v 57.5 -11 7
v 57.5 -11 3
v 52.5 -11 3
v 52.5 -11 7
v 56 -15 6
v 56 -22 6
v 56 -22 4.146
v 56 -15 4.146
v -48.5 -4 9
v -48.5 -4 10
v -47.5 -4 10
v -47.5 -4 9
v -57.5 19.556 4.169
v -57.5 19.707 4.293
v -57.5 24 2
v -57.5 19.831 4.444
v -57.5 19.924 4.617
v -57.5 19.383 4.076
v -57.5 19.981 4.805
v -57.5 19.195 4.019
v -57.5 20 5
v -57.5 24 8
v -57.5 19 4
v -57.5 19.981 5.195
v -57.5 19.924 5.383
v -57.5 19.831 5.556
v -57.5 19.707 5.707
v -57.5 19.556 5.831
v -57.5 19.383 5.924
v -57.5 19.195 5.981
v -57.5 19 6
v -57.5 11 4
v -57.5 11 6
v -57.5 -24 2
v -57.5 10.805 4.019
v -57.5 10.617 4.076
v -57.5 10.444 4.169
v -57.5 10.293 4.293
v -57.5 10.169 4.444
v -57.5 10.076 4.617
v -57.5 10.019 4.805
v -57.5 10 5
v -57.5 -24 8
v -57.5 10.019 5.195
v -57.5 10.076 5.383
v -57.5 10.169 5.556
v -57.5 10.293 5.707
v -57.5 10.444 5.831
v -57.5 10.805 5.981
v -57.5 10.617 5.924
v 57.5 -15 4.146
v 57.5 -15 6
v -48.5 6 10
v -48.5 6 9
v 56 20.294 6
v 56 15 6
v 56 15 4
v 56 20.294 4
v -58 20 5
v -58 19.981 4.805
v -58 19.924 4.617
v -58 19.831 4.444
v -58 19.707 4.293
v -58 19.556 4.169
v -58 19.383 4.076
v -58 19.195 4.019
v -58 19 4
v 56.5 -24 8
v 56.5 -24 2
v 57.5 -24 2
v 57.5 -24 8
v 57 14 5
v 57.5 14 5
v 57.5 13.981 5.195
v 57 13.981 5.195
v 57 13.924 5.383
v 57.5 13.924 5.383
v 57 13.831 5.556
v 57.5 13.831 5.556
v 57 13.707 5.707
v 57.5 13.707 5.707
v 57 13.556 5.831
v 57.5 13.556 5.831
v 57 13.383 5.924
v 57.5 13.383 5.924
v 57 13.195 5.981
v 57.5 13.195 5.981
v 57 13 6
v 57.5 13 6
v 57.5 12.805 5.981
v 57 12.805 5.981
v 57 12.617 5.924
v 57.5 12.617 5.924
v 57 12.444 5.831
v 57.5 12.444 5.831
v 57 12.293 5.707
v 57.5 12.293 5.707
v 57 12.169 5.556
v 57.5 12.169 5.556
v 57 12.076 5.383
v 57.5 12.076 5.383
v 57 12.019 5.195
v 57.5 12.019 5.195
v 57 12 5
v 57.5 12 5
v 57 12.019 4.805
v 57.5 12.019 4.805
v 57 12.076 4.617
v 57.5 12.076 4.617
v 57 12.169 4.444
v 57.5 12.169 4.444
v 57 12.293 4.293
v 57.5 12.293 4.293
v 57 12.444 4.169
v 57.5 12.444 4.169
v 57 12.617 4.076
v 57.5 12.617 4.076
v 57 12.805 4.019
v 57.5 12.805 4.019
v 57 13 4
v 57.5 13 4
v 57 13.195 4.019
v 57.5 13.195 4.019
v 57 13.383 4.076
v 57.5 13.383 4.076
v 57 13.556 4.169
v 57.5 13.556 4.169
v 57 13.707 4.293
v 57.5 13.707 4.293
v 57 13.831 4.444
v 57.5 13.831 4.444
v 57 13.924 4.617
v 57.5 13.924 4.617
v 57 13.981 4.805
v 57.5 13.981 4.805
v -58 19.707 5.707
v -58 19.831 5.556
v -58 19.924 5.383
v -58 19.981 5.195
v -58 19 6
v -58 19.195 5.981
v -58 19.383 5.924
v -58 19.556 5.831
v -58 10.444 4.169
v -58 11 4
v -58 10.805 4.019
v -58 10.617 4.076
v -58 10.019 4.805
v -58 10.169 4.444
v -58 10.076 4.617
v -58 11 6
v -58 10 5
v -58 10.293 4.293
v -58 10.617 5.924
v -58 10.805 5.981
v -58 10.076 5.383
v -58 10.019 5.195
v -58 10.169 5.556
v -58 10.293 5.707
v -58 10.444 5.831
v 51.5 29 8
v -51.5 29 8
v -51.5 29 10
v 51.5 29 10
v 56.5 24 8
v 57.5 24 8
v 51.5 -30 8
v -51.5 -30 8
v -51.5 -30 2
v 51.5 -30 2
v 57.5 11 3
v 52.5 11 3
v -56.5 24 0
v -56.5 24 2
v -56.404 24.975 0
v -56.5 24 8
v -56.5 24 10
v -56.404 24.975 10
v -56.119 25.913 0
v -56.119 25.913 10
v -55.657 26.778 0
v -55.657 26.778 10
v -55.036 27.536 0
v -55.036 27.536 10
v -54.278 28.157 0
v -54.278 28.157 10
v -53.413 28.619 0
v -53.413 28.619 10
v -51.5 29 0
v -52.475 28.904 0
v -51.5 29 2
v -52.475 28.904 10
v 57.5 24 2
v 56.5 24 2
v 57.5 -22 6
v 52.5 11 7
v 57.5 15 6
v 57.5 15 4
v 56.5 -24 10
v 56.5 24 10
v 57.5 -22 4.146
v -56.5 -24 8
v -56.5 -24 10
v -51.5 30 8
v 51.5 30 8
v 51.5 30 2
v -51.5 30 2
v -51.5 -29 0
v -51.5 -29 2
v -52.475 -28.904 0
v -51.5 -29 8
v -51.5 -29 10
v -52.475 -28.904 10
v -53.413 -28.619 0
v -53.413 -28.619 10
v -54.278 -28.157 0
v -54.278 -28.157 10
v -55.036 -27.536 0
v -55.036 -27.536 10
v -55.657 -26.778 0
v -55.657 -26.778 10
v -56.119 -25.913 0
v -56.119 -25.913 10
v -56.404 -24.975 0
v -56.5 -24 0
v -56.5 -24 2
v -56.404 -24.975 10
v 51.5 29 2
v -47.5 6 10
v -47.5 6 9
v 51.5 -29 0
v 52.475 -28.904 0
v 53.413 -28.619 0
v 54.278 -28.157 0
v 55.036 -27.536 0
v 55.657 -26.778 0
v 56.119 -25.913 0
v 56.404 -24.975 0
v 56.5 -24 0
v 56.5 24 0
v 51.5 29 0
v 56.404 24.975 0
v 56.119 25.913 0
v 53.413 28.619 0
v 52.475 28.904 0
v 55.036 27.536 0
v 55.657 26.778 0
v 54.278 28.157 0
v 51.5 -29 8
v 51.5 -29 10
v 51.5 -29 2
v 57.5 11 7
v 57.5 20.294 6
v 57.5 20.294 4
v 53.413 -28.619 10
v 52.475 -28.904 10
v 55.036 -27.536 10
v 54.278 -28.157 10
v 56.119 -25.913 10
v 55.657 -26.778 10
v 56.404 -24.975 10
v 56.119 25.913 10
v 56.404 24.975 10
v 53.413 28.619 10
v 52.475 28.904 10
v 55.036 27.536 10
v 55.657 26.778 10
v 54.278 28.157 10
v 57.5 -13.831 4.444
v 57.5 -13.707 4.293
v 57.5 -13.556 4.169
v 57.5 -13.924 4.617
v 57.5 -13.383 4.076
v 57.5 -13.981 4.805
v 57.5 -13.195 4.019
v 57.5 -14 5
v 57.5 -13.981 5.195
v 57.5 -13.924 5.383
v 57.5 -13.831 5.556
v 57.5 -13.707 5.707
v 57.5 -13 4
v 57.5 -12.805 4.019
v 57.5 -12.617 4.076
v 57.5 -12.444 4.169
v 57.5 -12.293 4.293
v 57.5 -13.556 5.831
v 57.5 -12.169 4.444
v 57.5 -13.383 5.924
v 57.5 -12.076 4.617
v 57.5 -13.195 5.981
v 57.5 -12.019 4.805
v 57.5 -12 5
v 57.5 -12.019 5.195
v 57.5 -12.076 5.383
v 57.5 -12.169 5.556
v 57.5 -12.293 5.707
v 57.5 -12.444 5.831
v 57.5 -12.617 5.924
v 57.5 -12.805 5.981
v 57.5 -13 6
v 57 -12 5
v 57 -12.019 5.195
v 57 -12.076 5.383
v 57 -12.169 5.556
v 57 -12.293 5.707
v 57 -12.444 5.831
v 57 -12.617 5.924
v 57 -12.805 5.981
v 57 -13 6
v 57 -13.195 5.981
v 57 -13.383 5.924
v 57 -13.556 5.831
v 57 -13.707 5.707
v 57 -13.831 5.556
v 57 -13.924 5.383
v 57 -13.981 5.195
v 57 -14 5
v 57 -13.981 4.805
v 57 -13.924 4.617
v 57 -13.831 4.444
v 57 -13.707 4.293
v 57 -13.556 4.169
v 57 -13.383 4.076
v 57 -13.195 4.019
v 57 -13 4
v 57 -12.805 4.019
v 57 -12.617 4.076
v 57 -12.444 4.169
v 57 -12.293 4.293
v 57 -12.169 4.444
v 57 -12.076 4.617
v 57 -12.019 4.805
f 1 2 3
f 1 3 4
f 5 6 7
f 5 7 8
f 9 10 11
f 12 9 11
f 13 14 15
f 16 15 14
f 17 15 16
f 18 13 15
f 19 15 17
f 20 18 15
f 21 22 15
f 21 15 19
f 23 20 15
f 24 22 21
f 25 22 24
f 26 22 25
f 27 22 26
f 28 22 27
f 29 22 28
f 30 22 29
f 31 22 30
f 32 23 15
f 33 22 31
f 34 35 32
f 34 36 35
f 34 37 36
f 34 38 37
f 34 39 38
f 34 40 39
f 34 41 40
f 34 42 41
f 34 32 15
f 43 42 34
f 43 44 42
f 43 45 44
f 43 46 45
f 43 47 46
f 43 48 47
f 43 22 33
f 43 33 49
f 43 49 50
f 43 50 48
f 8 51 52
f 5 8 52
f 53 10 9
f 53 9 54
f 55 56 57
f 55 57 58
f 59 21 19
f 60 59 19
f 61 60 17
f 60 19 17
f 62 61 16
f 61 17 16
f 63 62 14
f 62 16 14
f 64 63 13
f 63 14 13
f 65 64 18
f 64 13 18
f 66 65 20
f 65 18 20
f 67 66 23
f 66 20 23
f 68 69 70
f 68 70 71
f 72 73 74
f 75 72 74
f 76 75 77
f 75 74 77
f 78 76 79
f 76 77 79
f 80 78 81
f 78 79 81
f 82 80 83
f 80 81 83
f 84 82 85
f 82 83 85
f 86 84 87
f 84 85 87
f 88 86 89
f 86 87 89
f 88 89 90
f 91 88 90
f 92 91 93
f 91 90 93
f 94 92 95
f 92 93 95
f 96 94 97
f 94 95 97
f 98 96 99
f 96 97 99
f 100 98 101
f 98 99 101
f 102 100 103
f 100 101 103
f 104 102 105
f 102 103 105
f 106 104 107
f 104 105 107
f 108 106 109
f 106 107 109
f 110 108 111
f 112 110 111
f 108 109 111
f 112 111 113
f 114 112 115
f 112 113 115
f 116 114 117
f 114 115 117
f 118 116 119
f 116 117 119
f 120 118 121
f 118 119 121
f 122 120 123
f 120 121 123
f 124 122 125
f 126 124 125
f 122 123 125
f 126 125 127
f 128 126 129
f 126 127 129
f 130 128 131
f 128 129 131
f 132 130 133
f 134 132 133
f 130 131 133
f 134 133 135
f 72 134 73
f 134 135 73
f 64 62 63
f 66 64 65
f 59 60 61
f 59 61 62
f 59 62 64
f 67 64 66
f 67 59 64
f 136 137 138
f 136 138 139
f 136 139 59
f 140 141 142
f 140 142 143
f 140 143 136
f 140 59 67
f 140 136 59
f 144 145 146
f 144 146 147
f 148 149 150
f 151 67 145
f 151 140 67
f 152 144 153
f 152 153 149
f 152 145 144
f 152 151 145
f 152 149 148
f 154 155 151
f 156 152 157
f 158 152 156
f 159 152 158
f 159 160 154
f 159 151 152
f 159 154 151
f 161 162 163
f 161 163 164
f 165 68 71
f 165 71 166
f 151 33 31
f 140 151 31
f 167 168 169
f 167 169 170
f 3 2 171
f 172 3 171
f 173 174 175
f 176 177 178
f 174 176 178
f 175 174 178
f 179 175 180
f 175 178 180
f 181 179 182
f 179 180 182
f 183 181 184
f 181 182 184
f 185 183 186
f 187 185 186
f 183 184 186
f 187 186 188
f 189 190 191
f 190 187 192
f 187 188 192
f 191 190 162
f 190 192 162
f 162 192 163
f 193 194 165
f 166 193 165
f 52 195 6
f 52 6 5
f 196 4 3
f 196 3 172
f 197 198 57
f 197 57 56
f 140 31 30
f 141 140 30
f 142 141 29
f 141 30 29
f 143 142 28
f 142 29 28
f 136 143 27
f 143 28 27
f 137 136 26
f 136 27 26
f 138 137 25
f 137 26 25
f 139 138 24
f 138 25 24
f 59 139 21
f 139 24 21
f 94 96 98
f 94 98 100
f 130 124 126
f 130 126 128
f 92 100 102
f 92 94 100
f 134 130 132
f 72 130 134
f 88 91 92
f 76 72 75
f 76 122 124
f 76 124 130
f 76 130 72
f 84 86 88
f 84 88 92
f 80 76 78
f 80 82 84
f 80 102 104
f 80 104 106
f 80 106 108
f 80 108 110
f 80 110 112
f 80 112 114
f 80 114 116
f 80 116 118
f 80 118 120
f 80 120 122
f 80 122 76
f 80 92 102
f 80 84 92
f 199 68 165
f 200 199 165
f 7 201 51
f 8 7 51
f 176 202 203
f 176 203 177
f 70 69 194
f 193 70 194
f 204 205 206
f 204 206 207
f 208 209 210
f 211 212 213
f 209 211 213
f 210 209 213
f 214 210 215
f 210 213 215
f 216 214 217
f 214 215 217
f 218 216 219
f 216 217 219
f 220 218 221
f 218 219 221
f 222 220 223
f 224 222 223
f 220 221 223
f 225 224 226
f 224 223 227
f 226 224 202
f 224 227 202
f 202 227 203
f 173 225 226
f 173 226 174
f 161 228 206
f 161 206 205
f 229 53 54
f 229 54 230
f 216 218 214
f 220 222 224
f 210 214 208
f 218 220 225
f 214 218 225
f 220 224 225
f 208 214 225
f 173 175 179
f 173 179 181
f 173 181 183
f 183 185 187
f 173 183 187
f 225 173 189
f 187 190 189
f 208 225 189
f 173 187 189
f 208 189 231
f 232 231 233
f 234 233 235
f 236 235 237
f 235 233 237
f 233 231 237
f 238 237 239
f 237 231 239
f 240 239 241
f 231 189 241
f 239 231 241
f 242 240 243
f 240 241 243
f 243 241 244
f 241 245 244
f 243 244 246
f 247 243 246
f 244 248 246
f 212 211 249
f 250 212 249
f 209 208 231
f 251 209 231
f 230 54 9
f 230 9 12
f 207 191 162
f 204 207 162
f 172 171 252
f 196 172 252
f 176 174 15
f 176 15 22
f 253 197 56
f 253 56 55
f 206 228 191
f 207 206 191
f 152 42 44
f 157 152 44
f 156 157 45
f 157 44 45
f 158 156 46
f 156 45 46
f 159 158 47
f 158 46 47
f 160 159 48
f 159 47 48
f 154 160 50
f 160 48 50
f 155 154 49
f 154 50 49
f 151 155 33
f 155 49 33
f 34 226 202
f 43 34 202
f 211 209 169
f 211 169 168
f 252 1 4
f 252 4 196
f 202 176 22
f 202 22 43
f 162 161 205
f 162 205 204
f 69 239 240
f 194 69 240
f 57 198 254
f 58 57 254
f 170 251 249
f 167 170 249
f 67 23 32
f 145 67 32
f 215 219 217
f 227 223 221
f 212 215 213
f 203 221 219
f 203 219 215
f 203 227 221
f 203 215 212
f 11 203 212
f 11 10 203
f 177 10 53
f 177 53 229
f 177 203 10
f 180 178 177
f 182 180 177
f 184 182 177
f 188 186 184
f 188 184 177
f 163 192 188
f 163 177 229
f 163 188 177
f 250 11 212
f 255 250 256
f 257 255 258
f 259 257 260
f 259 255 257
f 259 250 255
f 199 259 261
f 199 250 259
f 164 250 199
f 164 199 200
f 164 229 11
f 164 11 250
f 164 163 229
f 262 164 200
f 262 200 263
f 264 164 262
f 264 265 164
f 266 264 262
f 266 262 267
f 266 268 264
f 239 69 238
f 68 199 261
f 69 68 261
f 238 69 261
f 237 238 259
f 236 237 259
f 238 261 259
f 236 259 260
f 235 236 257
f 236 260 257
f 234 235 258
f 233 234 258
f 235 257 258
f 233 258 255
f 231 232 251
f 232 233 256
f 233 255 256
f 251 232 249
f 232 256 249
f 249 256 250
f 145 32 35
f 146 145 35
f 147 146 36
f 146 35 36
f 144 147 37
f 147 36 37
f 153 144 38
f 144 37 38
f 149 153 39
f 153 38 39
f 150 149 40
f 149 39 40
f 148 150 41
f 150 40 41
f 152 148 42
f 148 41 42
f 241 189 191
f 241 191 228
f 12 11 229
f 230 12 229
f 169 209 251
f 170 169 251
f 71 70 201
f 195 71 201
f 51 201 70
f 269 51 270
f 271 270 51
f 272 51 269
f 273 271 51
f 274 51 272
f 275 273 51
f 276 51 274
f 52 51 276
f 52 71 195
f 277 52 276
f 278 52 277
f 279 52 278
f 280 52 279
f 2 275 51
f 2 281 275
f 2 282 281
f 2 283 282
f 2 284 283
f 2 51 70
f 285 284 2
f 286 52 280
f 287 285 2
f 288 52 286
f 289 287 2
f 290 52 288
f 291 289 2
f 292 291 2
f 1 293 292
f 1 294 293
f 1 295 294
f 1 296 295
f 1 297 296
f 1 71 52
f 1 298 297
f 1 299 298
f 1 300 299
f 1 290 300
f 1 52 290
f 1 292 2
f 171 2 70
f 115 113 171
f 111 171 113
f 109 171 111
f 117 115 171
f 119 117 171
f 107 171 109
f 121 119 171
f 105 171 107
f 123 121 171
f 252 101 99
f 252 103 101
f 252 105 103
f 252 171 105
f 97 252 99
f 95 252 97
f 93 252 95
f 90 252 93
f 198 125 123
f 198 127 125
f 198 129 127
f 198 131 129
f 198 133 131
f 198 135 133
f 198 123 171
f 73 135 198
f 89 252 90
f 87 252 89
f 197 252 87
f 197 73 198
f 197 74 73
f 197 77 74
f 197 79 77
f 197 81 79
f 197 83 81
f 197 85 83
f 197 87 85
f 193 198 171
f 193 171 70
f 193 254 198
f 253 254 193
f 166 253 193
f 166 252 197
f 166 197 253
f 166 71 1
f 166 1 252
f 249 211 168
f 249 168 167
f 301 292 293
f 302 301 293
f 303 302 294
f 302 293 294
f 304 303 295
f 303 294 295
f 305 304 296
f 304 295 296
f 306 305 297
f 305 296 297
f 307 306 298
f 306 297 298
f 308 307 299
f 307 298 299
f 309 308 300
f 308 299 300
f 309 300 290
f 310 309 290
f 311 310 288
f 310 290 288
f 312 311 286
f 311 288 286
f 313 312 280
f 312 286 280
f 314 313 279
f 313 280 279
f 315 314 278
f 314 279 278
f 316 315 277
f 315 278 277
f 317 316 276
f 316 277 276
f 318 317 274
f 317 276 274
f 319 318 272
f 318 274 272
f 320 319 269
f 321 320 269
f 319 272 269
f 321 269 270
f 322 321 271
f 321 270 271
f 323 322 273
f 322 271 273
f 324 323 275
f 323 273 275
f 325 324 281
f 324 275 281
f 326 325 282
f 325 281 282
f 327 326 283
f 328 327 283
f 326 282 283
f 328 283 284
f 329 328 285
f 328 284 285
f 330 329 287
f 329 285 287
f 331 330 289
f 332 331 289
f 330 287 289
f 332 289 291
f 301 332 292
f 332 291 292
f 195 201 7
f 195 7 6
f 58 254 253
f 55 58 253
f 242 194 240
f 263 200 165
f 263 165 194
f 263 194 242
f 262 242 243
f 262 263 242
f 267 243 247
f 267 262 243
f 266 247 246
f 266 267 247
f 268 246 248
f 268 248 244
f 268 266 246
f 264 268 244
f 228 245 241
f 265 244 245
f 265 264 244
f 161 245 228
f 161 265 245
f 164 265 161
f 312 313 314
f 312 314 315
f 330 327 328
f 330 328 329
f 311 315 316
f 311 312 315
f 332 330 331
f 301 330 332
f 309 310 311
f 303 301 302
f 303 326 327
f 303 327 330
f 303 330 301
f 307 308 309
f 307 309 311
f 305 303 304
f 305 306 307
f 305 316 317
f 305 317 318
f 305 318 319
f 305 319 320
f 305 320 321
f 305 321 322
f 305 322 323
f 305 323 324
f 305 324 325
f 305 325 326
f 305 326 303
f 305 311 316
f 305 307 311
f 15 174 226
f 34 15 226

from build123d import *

# Parameters (mm, degrees)
F0_W       = 113
F0_H       = 58
F1_DEPTH   = 10
F2_R       = 5
F3_R       = 5
F4_R       = 5
F5_R       = 5
F6_W       = 1
F6_H       = 10
F11_DEPTH  = 1
F10_W      = 48
F10_H      = 6
F12_DEPTH  = 1
F7_W       = 103
F7_H       = 6
F13_DEPTH  = 1
F8_W       = 48
F8_H       = 6
F14_DEPTH  = 1
F9_W       = 103
F9_H       = 6
F15_DEPTH  = 1
F16_W      = 22
F16_H      = 4
F17_DEPTH  = 5
F18_R      = 1
F19_DEPTH  = 0.5
F19_FACE_R = 1
F20_DEPTH  = 0.5
F21_DEPTH  = 0.5
F22_R      = 1
F23_DEPTH  = 0.5
F24_W      = 5.293664
F24_H      = 2
F25_DEPTH  = 1.5
F26_W      = 7
F26_H      = 1.853713
F28_DEPTH  = 1.5
F31_DEPTH  = 0.5
F32_R      = 2.5
F33_DEPTH  = 5
F33_FACE_R = 2.5
F34_DEPTH  = 5


with BuildPart() as f1:
    # F0 (on Top) → F1 (new body)
    with BuildSketch(Plane.XY):
        Rectangle(F0_W, F0_H)
    extrude(amount=F1_DEPTH)

    # F2
    f2_edges = [f1.edges().sort_by_distance(p)[0] for p in [
        (56.5, 29, 5),
    ]]
    fillet(f2_edges, radius=F2_R)

    # F3
    f3_edges = [f1.edges().sort_by_distance(p)[0] for p in [
        (56.5, -29, 5),
    ]]
    fillet(f3_edges, radius=F3_R)

    # F4
    f4_edges = [f1.edges().sort_by_distance(p)[0] for p in [
        (-56.5, -29, 5),
    ]]
    fillet(f4_edges, radius=F4_R)

    # F5
    f5_edges = [f1.edges().sort_by_distance(p)[0] for p in [
        (-56.5, 29, 5),
    ]]
    fillet(f5_edges, radius=F5_R)

    # F6 (on face) → F11 (cut)
    with BuildSketch(Plane.XY.offset(10)):
        with Locations((-48, 1)):
            Rectangle(F6_W, F6_H)
    extrude(amount=-F11_DEPTH, mode=Mode.SUBTRACT)

    # F10 (on face) → F12 (join)
    with BuildSketch(Plane(origin=(-56.5, 0, 0), x_dir=(0, -1, 0), z_dir=(-1, 0, 0))):
        with Locations((0, 5)):
            Rectangle(F10_W, F10_H)
    extrude(amount=F12_DEPTH)

    # F7 (on face) → F13 (join)
    with BuildSketch(Plane(origin=(0, 29, 0), x_dir=(-1, 0, 0), z_dir=(0, 1, 0))):
        with Locations((0, 5)):
            Rectangle(F7_W, F7_H)
    extrude(amount=F13_DEPTH)

    # F8 (on face) → F14 (join)
    with BuildSketch(Plane.YZ.offset(56.5)):
        with Locations((0, 5)):
            Rectangle(F8_W, F8_H)
    extrude(amount=F14_DEPTH)

    # F9 (on face) → F15 (join)
    with BuildSketch(Plane.XZ.offset(29)):
        with Locations((0, 5)):
            Rectangle(F9_W, F9_H)
    extrude(amount=F15_DEPTH)

    # F16 (on face) → F17 (cut)
    with BuildSketch(Plane.YZ.offset(57.5)):
        with Locations((0, 5)):
            Rectangle(F16_W, F16_H)
    extrude(amount=-F17_DEPTH, mode=Mode.SUBTRACT)

    # F18 (on face) → F19 (join)
    with BuildSketch(Plane.YZ.offset(57.5)):
        with Locations((13, 5)):
            Circle(F18_R)
    extrude(amount=F19_DEPTH)

    # F19_face (on face) → F20 (cut)
    with BuildSketch(Plane(origin=(58, 13, 5), x_dir=(0, 1, 0), z_dir=(1, 0, 0))):
        Circle(F19_FACE_R)
    extrude(amount=-F20_DEPTH, mode=Mode.SUBTRACT)

    # F18 (on face) → F21 (cut)
    with BuildSketch(Plane.YZ.offset(57.5)):
        with Locations((13, 5)):
            Circle(F18_R)
    extrude(amount=-F21_DEPTH, mode=Mode.SUBTRACT)

    # F22 (on face) → F23 (cut)
    with BuildSketch(Plane.YZ.offset(57.5)):
        with Locations((-13, 5)):
            Circle(F22_R)
    extrude(amount=-F23_DEPTH, mode=Mode.SUBTRACT)

    # F24 (on face) → F25 (cut)
    with BuildSketch(Plane.YZ.offset(57.5)):
        with Locations((17.646832, 5)):
            Rectangle(F24_W, F24_H)
    extrude(amount=-F25_DEPTH, mode=Mode.SUBTRACT)

    # F26 (on face) → F28 (cut)
    with BuildSketch(Plane.YZ.offset(57.5)):
        with Locations((-18.5, 5.073144)):
            Rectangle(F26_W, F26_H)
    extrude(amount=-F28_DEPTH, mode=Mode.SUBTRACT)

    # F30 (on face) → F31 (join)
    with BuildSketch(Plane(origin=(-57.5, 0, 0), x_dir=(0, -1, 0), z_dir=(-1, 0, 0))):
        with BuildLine():
            Line((-19, 4), (-11, 4))
            ThreePointArc((-11, 4), (-10.292893, 4.292893), (-10, 5))
            ThreePointArc((-10, 5), (-10.292893, 5.707107), (-11, 6))
            Line((-11, 6), (-19, 6))
            ThreePointArc((-19, 6), (-19.707107, 5.707107), (-20, 5))
            ThreePointArc((-20, 5), (-19.707107, 4.292893), (-19, 4))
        make_face()
    extrude(amount=F31_DEPTH)

    # F32 (on face) → F33 (join)
    with BuildSketch(Plane(origin=(-57.5, 0, 0), x_dir=(0, -1, 0), z_dir=(-1, 0, 0))):
        with Locations((16.500002, 5.005926)):
            Circle(F32_R)
    extrude(amount=F33_DEPTH)

    # F33_face (on face) → F34 (cut)
    with BuildSketch(Plane(origin=(-62.5, -16.500002, 5.005926), x_dir=(0, -1, 0), z_dir=(-1, 0, 0))):
        Circle(F33_FACE_R)
    extrude(amount=-F34_DEPTH, mode=Mode.SUBTRACT)


solid = f1.part
